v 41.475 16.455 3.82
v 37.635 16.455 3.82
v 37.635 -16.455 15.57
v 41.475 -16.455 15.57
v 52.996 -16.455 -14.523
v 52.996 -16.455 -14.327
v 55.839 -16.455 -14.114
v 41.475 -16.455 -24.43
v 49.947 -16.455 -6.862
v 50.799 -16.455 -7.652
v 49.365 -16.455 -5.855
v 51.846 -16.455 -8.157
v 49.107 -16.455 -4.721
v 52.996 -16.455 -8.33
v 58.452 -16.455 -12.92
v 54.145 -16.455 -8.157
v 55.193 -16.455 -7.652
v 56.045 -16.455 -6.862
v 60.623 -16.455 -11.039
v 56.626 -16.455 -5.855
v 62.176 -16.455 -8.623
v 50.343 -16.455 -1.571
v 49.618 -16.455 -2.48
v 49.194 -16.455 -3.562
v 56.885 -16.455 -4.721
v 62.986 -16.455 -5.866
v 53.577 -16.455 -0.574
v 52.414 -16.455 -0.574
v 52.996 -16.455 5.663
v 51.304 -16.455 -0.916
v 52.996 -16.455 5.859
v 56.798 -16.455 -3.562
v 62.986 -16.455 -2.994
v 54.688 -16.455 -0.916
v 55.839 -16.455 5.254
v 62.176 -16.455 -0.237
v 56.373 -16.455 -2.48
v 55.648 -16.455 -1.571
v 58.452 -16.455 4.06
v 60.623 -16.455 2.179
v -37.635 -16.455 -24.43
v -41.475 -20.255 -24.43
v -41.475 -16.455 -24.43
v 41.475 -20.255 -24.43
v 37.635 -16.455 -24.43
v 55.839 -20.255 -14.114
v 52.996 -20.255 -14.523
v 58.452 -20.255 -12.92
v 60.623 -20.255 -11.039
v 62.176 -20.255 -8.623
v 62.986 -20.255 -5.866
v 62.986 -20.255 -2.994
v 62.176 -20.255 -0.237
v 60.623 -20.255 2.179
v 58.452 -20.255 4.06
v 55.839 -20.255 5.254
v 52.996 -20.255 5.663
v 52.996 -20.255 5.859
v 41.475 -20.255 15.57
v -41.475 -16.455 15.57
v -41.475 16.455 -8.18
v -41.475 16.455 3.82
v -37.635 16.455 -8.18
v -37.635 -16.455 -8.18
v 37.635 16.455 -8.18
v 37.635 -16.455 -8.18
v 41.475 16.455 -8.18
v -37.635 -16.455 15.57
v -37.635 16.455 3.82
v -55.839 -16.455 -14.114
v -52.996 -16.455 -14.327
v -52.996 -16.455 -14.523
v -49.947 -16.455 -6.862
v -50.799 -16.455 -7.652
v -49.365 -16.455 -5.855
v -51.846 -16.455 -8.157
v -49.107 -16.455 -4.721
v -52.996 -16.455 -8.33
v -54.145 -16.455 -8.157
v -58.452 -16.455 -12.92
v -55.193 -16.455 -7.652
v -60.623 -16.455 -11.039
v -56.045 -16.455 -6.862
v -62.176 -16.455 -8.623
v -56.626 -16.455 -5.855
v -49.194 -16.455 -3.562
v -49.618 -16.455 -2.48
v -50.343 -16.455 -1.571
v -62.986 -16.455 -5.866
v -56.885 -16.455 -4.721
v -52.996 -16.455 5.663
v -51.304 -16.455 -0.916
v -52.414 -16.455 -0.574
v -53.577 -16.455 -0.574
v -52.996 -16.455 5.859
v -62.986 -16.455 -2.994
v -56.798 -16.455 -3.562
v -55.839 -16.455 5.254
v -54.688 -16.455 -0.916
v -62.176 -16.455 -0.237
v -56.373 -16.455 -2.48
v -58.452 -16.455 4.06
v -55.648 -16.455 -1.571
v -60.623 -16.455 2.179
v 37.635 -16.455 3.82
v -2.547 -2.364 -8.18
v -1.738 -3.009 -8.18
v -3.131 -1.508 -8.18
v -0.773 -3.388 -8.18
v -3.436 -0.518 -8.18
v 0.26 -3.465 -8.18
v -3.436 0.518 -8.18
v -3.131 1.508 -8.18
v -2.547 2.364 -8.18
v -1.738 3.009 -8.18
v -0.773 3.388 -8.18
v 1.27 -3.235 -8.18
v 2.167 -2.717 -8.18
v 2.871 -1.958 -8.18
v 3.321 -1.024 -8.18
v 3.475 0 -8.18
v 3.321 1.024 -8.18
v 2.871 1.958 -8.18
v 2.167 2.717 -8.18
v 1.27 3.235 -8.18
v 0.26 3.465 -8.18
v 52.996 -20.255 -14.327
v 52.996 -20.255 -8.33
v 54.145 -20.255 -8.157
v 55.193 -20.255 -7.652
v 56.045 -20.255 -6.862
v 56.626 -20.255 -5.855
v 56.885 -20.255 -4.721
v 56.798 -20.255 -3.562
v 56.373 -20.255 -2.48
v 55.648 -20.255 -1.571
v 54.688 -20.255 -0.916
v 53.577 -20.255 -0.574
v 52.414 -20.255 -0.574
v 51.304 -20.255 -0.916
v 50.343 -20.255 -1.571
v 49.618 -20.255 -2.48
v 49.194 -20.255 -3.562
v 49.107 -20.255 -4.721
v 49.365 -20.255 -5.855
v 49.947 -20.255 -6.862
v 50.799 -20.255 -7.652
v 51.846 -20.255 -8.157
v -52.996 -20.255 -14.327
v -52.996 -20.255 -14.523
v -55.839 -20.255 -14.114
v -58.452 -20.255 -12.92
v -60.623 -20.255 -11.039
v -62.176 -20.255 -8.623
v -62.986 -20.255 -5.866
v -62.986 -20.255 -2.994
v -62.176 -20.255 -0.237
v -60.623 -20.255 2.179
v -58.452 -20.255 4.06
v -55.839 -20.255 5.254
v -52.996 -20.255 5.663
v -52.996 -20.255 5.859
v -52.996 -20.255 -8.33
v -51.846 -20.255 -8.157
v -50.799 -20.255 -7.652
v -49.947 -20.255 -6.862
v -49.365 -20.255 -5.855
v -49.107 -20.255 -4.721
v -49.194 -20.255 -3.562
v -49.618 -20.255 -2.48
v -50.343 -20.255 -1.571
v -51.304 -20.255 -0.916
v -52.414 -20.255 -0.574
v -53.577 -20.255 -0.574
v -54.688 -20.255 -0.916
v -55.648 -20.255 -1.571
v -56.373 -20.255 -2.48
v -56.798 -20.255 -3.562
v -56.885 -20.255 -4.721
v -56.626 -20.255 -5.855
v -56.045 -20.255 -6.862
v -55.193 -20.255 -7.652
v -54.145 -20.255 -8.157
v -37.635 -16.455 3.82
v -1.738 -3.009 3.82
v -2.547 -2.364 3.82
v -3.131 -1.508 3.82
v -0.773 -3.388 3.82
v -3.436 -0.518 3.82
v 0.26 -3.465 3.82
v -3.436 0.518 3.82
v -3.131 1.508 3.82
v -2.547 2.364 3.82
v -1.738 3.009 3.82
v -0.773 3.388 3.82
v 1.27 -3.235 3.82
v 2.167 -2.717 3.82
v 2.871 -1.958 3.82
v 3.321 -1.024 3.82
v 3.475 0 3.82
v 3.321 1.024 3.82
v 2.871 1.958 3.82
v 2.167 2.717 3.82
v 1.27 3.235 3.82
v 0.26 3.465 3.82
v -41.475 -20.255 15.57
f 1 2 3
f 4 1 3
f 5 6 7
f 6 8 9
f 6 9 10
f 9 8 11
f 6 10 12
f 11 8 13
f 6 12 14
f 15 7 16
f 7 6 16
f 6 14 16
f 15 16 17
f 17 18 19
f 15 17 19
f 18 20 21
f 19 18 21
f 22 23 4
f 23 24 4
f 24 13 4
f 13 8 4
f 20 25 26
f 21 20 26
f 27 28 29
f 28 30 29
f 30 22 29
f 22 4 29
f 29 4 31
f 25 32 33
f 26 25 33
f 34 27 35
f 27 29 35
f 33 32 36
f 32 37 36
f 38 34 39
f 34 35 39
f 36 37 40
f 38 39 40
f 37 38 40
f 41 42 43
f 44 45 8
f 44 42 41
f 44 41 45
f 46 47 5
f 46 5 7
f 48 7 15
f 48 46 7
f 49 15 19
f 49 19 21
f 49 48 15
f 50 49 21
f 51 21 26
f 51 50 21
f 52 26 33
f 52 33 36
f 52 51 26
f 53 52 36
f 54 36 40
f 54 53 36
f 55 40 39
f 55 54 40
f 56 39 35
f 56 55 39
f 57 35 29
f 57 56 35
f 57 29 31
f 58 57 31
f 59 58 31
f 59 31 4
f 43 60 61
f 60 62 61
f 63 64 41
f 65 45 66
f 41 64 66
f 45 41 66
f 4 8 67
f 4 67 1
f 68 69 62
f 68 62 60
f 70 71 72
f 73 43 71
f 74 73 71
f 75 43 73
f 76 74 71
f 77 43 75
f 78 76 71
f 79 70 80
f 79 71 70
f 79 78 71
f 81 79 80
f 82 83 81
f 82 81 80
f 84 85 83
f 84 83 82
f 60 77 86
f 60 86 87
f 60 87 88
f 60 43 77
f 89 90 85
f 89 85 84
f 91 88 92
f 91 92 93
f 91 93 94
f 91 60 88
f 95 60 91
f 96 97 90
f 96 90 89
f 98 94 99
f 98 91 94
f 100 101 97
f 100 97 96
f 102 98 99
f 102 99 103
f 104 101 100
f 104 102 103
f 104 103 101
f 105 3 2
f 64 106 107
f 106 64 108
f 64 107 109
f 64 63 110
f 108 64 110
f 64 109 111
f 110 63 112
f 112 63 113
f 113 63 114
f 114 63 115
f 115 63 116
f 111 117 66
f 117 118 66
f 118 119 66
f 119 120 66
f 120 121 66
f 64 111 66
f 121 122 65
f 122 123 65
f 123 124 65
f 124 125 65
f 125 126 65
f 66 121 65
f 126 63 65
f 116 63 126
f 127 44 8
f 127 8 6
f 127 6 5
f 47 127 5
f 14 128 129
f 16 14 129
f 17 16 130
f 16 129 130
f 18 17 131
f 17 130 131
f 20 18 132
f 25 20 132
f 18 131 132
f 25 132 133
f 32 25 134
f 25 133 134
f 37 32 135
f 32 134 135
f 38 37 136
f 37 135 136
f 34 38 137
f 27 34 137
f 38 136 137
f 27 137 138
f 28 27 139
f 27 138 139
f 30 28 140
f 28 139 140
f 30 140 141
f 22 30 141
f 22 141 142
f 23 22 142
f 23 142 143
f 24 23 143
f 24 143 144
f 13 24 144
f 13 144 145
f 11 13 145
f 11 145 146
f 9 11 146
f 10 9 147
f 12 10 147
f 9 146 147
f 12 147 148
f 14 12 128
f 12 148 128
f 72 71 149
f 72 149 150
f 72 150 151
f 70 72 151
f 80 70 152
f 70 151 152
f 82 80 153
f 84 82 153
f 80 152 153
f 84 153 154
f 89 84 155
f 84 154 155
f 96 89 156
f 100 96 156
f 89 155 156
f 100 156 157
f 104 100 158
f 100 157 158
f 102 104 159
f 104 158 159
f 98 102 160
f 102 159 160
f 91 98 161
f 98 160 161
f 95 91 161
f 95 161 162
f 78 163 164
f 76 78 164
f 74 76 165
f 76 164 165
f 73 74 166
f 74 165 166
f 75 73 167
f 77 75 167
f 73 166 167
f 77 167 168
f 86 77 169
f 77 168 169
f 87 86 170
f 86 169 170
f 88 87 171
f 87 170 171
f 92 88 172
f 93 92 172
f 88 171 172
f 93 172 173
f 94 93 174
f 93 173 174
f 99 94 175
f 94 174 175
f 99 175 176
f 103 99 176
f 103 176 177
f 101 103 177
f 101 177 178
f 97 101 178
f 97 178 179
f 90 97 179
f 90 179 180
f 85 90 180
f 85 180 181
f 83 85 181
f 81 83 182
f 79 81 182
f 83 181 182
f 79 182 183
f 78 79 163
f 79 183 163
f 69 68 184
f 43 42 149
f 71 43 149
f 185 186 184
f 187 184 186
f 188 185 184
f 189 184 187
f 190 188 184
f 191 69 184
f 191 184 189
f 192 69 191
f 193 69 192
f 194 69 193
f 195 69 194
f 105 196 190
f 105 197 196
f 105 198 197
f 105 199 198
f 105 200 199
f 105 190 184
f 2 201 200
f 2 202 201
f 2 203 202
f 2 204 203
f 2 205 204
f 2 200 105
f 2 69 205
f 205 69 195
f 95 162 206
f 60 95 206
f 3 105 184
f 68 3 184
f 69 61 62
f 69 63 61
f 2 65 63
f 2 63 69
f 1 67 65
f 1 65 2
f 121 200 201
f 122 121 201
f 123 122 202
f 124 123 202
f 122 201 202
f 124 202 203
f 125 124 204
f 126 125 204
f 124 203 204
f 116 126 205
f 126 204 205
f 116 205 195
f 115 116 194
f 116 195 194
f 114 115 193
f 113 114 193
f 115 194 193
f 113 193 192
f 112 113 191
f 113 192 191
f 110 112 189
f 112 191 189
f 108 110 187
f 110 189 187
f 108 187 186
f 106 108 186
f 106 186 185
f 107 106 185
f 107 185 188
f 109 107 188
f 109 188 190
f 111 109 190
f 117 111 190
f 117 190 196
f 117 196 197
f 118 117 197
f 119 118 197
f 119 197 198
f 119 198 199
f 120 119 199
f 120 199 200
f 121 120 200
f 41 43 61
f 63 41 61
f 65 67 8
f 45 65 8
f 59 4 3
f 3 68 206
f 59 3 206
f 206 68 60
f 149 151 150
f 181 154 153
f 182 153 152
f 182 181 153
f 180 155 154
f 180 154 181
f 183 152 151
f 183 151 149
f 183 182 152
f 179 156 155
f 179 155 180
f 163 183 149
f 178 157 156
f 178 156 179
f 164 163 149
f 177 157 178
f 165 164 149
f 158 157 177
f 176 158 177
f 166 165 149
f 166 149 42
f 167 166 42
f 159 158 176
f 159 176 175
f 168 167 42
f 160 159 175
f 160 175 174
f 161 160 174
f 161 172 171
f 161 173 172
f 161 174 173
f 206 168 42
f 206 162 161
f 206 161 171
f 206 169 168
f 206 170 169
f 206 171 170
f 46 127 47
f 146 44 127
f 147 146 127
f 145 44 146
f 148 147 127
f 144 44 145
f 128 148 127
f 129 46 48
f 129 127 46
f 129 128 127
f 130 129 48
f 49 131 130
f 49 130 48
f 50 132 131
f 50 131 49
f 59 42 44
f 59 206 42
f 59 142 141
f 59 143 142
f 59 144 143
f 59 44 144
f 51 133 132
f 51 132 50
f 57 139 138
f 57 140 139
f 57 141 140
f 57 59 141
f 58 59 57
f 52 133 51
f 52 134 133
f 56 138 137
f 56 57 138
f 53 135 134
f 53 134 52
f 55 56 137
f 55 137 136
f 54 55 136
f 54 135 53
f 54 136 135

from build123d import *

# Parameters (mm, degrees)
CROQUIS3_W               = 75.27
CROQUIS3_H               = 32.91
SALIENTE_EXTRUIR1_DEPTH  = 3.82
SALIENTE_EXTRUIR2_DEPTH  = 3.84
SALIENTE_EXTRUIR3_DEPTH  = 3.84
CROQUIS8_W               = 82.95
CROQUIS8_H               = 15.57
SALIENTE_EXTRUIR5_DEPTH  = 3.8
CROQUIS9_W               = 82.95
CROQUIS9_H               = 24.43
SALIENTE_EXTRUIR7_DEPTH  = 3.8
CROQUIS10_W              = 82.95
CROQUIS10_H              = 8.18
SALIENTE_EXTRUIR9_DEPTH  = 33.8
CROQUIS11_R              = 3.475
CORTAR_EXTRUIR3_DEPTH    = 33.8
SALIENTE_EXTRUIR10_DEPTH = 3.84
SALIENTE_EXTRUIR11_DEPTH = 3.84
CROQUIS15_R              = 3.9
SALIENTE_EXTRUIR12_DEPTH = 3.8


with BuildPart() as part:
    # Croquis3 → Saliente-Extruir1 (new body)
    with BuildSketch(Plane.XY):
        Rectangle(CROQUIS3_W, CROQUIS3_H)
    extrude(amount=SALIENTE_EXTRUIR1_DEPTH)

    # Croquis4 → Saliente-Extruir2 (add)
    with BuildSketch(Plane(origin=(37.635, 0, 0), x_dir=(0, 0, -1), z_dir=(1, 0, 0))):
        Polygon((-3.82, -16.455), (0, -16.455), (0, 16.455), (-3.82, 16.455), (-15.57, -16.455), align=None)
    extrude(amount=SALIENTE_EXTRUIR2_DEPTH)

    # Croquis5 → Saliente-Extruir3 (add)
    with BuildSketch(Plane.ZY.offset(37.635)):
        Polygon((3.82, -16.455), (0, -16.455), (0, 16.455), (3.82, 16.455), (15.57, -16.455), align=None)
    extrude(amount=SALIENTE_EXTRUIR3_DEPTH)

    # Croquis8 → Saliente-Extruir5 (add)
    with BuildSketch(Plane(origin=(0, -16.455, 0), x_dir=(-1, 0, 0), z_dir=(0, -1, 0))):
        with Locations((0, -7.785)):
            Rectangle(CROQUIS8_W, CROQUIS8_H)
    extrude(amount=SALIENTE_EXTRUIR5_DEPTH)

    # Croquis9 → Saliente-Extruir7 (add)
    with BuildSketch(Plane.XZ.offset(20.255)):
        with Locations((0, -12.215)):
            Rectangle(CROQUIS9_W, CROQUIS9_H)
    extrude(amount=-SALIENTE_EXTRUIR7_DEPTH)

    # Croquis10 → Saliente-Extruir9 (add)
    with BuildSketch(Plane(origin=(0, 16.455, 0), x_dir=(1, 0, 0), z_dir=(0, 1, 0))):
        with Locations((0, 4.09)):
            Rectangle(CROQUIS10_W, CROQUIS10_H)
    extrude(amount=-SALIENTE_EXTRUIR9_DEPTH)

    # Croquis11 → Cortar-Extruir3 (cut)
    with BuildSketch(Plane.XY.offset(3.82)):
        Circle(CROQUIS11_R)
    extrude(amount=-CORTAR_EXTRUIR3_DEPTH, mode=Mode.SUBTRACT)

    # Croquis12 → Saliente-Extruir10 (add)
    with BuildSketch(Plane(origin=(41.475, 0, 0), x_dir=(0, 0, -1), z_dir=(1, 0, 0))):
        Polygon((8.18, 16.455), (24.43, -16.455), (8.18, -16.455), align=None)
    extrude(amount=-SALIENTE_EXTRUIR10_DEPTH)

    # Croquis14 → Saliente-Extruir11 (add)
    with BuildSketch(Plane.ZY.offset(41.475)):
        Polygon((-8.18, 16.455), (-8.18, -16.772028127), (-24.43, -16.455), align=None)
    extrude(amount=-SALIENTE_EXTRUIR11_DEPTH)

    # Croquis15 → Saliente-Extruir12 (add)
    # profile 1 of 2: a face of its own
    with BuildSketch(Plane.XZ.offset(20.255)):
        with BuildLine():
            Line((41.475, 15.57), (41.475, -24.43))
            Line((41.475, -24.43), (52.99576157, -14.32670597))
            Line((52.99576157, -14.32670597), (52.99576157, -14.522664239))
            ThreePointArc((52.99576157, -14.522664239), (63.088425809, -4.43), (52.99576157, 5.662664239))
            Line((52.99576157, 5.662664239), (52.99576157, 5.858622508))
            Line((52.99576157, 5.858622508), (41.475, 15.57))
        make_face()
        with Locations(Location((52.99576157, -4.43, 0), (0, 0, 270))):
            Circle(CROQUIS15_R, mode=Mode.SUBTRACT)
    # profile 2 of 2: a face of its own
    with BuildSketch(Plane.XZ.offset(20.255)):
        with BuildLine():
            Line((-52.99576157, 5.858622508), (-41.475, 15.57))
            Line((-41.475, 15.57), (-41.475, -24.43))
            Line((-41.475, -24.43), (-52.99576157, -14.32670597))
            Line((-52.99576157, -14.32670597), (-52.99576157, -14.522664239))
            ThreePointArc((-52.99576157, -14.522664239), (-63.088425809, -4.43), (-52.99576157, 5.662664239))
            Line((-52.99576157, 5.662664239), (-52.99576157, 5.858622508))
        make_face()
        with Locations(Location((-52.99576157, -4.43, 0), (0, 0, 270))):
            Circle(CROQUIS15_R, mode=Mode.SUBTRACT)
    extrude(amount=-SALIENTE_EXTRUIR12_DEPTH)


solid = part.part
